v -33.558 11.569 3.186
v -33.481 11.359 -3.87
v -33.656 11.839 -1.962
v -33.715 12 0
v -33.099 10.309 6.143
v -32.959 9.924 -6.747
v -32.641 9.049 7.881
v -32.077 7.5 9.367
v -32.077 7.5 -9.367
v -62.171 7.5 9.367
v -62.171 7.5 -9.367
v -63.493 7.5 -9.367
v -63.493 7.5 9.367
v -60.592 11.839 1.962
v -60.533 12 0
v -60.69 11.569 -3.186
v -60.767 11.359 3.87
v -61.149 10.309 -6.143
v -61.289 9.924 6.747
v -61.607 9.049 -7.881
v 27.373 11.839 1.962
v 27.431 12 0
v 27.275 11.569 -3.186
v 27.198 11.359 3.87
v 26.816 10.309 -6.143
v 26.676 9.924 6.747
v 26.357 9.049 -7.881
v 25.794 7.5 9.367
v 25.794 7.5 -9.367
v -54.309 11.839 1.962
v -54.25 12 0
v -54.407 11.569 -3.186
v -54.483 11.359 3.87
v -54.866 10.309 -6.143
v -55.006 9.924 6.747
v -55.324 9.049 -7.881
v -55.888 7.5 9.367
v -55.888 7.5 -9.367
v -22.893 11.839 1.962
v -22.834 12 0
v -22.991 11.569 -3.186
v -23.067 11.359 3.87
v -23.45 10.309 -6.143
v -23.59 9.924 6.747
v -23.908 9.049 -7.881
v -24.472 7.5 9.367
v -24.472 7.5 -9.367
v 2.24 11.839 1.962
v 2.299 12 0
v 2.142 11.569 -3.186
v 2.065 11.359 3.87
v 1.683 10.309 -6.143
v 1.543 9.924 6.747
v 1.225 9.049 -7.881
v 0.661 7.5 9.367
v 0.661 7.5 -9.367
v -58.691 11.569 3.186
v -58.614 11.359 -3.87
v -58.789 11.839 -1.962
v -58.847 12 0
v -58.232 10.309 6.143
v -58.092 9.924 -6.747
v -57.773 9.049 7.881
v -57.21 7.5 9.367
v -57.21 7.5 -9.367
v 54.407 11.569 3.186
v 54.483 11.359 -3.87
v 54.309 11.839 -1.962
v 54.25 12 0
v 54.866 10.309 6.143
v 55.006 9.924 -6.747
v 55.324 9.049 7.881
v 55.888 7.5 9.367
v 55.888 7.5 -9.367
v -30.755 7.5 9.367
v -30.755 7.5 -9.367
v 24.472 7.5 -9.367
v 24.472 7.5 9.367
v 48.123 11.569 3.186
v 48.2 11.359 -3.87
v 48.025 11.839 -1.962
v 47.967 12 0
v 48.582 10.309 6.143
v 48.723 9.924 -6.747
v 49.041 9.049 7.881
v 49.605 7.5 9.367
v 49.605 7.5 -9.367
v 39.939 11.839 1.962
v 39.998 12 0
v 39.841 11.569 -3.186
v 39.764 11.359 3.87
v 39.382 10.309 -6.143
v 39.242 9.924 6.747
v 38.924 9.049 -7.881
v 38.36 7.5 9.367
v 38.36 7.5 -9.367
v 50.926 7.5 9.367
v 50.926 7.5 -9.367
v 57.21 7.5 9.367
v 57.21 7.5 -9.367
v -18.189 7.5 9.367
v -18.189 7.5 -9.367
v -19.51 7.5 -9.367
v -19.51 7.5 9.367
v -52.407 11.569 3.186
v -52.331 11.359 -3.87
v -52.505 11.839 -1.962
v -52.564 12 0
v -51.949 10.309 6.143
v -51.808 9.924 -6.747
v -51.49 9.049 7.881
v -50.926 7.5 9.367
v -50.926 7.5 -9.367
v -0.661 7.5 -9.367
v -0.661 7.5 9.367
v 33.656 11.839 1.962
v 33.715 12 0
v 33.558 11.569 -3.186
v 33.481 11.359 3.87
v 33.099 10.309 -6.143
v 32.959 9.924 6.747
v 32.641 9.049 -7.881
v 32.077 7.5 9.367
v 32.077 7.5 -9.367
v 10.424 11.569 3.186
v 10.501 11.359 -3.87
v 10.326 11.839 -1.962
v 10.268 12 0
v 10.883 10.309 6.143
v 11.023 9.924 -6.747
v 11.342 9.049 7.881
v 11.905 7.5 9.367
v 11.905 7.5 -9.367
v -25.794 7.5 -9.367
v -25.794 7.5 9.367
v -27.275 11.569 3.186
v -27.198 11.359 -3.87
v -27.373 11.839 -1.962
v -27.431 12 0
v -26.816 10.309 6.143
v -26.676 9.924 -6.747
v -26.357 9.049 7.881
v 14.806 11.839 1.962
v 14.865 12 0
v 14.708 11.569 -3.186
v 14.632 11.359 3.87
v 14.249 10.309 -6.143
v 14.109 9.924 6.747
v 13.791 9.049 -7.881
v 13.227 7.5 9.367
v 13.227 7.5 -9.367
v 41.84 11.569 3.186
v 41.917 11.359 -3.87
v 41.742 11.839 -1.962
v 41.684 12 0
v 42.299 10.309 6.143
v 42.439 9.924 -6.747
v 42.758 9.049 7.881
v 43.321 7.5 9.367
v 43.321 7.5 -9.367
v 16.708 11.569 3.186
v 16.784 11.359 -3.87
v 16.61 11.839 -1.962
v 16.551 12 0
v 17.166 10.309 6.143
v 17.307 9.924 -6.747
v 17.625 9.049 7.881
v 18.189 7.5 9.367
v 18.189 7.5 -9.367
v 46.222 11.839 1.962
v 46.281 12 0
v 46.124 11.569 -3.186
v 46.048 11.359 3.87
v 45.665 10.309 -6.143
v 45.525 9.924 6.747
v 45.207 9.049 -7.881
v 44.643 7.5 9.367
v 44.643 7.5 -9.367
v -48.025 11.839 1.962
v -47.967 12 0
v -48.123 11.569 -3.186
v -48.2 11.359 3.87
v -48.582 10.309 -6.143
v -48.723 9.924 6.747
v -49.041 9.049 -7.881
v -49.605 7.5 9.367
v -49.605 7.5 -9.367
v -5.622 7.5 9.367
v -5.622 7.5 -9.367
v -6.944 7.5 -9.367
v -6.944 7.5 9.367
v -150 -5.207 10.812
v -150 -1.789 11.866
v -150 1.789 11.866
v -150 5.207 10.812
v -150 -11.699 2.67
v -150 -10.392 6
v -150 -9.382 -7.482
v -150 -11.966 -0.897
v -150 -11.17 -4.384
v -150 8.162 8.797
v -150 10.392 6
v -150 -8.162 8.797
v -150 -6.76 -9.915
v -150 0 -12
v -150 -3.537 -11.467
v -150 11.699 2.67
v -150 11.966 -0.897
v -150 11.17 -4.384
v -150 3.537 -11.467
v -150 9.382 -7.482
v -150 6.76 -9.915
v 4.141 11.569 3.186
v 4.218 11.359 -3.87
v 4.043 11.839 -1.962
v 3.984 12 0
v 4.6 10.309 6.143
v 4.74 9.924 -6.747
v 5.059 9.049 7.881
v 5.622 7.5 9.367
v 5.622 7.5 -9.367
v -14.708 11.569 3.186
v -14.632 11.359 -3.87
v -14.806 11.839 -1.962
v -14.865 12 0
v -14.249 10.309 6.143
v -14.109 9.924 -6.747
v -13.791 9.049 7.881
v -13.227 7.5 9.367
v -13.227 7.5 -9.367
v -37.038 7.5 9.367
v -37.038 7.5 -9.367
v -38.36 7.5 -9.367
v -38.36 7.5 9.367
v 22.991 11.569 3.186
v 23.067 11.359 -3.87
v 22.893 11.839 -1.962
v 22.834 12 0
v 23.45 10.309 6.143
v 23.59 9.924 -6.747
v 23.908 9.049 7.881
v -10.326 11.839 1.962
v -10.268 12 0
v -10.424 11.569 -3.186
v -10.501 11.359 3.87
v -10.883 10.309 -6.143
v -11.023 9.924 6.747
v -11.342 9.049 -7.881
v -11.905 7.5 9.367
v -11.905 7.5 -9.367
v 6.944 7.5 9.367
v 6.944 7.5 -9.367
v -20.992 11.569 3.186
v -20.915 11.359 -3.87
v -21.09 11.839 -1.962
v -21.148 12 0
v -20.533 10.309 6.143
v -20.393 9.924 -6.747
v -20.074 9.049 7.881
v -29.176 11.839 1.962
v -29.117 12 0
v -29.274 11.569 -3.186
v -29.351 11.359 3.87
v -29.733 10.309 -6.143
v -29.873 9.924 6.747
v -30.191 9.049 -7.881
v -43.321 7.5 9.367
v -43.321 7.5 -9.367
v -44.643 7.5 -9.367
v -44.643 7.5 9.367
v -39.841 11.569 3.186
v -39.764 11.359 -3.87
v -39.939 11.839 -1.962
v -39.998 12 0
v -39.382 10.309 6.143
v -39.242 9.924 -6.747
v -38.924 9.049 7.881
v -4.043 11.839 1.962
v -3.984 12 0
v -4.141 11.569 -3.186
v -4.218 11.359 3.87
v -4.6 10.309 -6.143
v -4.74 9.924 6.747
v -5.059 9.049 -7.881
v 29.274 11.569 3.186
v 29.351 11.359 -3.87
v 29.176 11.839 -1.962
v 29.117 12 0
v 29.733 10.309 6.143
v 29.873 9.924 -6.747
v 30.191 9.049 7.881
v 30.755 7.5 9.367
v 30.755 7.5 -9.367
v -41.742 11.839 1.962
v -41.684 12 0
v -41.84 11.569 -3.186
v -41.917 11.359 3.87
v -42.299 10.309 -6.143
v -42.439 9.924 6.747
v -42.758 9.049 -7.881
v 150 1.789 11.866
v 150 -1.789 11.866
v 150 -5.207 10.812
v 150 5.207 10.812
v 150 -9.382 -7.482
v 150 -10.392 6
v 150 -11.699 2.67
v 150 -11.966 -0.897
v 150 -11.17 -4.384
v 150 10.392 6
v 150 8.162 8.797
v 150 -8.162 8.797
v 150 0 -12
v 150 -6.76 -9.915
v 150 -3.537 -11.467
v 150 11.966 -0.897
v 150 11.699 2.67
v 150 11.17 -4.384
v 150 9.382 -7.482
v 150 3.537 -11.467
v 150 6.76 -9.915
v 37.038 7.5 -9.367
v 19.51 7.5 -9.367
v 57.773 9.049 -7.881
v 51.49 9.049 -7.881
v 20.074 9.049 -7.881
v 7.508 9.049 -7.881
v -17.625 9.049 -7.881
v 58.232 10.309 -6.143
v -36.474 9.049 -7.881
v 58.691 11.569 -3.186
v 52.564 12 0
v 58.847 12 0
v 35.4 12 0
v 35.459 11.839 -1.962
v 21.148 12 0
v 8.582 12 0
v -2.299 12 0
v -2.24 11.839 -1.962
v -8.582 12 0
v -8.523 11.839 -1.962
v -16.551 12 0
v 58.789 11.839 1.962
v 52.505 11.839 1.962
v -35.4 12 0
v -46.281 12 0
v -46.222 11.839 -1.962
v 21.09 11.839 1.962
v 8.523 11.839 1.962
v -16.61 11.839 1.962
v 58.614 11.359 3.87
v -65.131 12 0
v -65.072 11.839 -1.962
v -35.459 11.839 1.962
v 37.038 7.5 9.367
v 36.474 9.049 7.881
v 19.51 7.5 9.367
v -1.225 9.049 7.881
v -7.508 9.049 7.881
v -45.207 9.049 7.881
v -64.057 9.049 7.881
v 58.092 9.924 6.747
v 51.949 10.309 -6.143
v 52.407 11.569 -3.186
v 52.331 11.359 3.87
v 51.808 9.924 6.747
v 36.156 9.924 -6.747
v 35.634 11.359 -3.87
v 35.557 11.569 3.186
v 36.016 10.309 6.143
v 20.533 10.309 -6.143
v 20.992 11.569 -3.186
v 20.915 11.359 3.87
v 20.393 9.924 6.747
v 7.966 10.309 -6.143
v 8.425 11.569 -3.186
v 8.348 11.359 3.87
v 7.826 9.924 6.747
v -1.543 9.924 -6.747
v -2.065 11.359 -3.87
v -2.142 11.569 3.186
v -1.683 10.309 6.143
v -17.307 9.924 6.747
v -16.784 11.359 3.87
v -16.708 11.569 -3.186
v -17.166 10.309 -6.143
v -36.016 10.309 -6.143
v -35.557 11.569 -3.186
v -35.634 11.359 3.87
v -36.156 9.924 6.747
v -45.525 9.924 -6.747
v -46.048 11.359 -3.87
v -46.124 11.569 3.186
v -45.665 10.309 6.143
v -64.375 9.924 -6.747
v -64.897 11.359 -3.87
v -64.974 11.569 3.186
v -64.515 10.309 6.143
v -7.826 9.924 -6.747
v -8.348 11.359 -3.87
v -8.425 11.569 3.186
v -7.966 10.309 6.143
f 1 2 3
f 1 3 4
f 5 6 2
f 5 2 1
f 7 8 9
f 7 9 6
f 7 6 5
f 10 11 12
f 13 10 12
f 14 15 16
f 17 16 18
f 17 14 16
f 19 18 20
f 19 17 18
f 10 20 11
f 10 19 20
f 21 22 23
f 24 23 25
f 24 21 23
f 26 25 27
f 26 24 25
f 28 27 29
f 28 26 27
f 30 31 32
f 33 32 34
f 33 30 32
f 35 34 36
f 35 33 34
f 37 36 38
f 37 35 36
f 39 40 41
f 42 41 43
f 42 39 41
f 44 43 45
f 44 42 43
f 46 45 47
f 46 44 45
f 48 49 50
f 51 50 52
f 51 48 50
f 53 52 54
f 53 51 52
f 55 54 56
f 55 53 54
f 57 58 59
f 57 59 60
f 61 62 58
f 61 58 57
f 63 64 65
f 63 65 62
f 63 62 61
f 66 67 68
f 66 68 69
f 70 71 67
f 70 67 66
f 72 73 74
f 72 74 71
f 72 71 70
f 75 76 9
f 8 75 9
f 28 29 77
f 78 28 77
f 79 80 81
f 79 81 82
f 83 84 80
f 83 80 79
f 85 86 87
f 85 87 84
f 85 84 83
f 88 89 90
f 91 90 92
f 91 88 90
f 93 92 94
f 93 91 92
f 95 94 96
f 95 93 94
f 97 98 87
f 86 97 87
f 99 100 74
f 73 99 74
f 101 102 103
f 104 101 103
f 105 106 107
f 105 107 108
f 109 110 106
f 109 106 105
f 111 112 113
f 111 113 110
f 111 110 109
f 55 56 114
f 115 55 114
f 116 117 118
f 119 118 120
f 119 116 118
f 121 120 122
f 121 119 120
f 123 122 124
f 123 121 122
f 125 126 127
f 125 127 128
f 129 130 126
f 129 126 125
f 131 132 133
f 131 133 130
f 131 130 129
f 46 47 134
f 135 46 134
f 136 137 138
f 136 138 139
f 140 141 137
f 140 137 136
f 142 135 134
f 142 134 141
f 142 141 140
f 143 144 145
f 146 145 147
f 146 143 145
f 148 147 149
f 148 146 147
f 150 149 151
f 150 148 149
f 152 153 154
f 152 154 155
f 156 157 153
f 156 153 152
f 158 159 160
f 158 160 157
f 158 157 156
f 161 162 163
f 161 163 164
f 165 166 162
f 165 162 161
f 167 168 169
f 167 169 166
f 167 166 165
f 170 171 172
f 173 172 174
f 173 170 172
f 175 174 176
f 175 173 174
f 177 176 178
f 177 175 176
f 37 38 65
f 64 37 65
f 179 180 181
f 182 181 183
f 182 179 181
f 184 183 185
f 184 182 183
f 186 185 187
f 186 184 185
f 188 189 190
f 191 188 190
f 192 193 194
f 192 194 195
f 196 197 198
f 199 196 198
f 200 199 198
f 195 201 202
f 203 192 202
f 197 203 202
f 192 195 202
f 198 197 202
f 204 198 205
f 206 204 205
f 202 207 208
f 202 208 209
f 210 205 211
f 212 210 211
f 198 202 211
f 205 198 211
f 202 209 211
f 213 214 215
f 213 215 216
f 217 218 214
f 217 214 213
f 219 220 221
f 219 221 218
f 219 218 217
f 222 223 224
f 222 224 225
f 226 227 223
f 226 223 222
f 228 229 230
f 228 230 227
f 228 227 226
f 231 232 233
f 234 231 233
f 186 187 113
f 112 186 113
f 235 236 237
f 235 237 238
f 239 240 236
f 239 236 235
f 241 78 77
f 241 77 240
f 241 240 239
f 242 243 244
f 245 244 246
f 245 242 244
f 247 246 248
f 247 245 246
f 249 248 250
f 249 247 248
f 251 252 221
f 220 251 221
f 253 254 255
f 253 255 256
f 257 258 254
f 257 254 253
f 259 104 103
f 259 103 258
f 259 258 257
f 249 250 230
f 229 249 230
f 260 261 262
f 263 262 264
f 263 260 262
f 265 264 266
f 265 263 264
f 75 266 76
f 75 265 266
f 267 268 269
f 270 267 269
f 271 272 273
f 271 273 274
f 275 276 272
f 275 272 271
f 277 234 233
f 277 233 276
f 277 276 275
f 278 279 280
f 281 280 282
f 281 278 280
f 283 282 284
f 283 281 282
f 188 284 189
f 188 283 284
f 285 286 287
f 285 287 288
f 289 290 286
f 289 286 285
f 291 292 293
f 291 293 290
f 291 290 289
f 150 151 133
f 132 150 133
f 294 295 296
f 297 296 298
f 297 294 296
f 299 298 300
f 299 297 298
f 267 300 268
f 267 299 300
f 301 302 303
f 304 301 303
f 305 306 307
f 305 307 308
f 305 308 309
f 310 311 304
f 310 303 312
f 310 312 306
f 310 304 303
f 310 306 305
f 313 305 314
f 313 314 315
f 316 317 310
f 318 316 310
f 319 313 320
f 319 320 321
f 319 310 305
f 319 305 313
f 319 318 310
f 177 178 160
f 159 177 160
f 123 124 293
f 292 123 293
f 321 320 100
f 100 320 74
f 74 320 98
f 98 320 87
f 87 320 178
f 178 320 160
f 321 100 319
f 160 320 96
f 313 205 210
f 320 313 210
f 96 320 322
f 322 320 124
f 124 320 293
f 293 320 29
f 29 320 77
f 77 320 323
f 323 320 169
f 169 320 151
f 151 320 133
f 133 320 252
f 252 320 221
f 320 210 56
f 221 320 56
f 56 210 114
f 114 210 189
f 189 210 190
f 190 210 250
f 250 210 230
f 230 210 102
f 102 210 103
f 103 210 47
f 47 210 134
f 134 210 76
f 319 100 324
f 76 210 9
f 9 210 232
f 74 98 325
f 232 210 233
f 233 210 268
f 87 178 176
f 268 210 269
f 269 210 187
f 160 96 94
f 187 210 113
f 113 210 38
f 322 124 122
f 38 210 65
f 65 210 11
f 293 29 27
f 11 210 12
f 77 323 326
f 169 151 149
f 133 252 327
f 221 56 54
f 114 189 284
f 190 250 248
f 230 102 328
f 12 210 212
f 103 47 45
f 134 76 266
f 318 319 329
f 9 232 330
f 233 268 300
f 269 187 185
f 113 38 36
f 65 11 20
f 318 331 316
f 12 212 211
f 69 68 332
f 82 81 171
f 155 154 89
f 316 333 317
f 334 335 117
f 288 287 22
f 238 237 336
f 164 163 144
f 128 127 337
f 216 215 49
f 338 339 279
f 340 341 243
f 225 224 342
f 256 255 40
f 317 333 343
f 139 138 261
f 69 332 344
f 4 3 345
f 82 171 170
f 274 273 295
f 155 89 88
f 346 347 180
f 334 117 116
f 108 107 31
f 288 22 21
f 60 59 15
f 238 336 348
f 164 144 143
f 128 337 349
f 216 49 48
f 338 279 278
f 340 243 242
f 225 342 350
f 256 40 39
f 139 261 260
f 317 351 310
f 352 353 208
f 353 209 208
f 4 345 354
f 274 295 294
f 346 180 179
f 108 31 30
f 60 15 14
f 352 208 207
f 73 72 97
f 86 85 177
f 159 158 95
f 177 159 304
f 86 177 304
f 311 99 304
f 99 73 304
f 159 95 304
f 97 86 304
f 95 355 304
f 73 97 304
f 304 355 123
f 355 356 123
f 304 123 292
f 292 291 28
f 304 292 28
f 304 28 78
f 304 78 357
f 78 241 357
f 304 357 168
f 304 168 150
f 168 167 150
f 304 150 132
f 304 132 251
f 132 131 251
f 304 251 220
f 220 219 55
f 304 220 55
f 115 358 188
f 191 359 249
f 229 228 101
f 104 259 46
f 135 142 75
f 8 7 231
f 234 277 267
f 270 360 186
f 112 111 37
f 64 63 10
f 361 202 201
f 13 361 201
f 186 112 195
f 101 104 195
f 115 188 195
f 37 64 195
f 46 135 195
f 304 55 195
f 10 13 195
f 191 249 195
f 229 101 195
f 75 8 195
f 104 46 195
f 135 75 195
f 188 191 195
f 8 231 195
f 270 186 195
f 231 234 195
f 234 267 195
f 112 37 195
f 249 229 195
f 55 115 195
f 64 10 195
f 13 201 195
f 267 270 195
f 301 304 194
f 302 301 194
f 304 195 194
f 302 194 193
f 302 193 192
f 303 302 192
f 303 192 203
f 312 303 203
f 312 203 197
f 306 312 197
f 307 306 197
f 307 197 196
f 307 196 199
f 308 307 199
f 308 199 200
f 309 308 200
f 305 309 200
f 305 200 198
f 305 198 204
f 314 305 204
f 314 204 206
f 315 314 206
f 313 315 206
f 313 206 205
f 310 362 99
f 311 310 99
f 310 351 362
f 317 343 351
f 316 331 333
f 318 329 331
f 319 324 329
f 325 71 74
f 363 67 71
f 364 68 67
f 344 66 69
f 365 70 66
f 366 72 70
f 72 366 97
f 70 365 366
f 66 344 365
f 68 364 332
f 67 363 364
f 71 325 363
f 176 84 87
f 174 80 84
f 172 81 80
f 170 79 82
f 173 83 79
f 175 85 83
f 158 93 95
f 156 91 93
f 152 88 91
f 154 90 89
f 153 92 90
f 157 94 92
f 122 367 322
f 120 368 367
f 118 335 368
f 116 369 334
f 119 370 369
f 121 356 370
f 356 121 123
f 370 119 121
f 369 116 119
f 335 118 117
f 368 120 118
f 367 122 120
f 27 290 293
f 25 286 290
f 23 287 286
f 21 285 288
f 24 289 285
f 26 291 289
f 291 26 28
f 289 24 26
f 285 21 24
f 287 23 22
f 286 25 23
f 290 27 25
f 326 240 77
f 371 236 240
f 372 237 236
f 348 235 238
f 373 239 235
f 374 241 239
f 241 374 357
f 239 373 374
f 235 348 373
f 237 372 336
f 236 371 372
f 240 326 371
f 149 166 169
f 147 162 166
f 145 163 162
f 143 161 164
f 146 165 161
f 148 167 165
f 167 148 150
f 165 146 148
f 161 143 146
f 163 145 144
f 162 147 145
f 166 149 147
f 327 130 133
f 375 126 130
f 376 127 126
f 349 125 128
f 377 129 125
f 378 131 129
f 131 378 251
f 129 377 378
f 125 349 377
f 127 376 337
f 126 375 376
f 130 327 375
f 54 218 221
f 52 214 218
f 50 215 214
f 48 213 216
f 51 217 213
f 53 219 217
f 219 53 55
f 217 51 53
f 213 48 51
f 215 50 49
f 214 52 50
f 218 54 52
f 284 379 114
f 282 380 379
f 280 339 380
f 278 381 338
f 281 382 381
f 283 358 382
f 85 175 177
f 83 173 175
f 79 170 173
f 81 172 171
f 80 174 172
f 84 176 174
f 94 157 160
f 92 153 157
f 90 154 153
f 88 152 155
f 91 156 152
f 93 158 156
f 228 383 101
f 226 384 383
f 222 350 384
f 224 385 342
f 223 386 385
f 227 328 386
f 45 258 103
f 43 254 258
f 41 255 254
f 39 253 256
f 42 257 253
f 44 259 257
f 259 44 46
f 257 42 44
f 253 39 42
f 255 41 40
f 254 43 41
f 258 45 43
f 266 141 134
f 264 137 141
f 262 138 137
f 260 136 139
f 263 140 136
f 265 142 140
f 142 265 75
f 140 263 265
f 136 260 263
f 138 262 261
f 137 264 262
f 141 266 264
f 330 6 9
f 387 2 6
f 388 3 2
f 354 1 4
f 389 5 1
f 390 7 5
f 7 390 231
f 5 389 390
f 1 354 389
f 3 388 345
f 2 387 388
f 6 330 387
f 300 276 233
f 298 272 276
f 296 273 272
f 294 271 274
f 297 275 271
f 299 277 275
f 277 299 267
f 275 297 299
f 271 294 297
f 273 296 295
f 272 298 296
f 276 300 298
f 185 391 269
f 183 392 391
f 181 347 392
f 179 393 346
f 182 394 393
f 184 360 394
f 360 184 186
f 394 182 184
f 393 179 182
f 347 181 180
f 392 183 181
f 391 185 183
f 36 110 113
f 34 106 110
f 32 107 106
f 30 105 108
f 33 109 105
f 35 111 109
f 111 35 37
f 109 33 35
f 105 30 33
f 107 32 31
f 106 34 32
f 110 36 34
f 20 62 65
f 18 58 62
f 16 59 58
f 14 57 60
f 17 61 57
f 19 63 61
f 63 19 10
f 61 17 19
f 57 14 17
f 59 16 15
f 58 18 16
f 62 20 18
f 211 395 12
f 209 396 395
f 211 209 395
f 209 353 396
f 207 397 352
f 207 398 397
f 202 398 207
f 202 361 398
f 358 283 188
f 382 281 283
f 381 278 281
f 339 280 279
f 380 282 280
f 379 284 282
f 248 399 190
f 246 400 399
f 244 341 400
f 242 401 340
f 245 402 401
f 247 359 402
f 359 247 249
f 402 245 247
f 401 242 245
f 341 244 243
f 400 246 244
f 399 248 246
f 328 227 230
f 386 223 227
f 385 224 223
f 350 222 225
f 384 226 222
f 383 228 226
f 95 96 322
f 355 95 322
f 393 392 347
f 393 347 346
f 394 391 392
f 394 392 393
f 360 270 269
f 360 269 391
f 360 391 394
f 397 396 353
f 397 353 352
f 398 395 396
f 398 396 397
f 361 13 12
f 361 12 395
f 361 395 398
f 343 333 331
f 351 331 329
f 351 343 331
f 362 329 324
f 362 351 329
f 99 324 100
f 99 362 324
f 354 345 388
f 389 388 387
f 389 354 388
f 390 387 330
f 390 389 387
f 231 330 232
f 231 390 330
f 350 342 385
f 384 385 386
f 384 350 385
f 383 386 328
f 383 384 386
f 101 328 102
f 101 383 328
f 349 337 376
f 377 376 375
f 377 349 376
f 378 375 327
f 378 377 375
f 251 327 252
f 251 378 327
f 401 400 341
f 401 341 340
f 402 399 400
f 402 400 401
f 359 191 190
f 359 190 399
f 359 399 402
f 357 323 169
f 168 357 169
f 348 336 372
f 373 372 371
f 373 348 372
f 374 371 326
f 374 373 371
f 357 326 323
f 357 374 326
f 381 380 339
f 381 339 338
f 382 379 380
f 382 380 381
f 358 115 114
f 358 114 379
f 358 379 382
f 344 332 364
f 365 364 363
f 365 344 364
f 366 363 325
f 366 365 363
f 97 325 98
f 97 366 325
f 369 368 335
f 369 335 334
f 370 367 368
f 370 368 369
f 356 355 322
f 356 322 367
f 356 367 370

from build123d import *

# Parameters (mm, degrees)
BOSS_EXTRUDE1_DEPTH      = 150
BOSS_EXTRUDE1_DEPTH_BACK = 150
SKETCH1_R                = 12
CUT_EXTRUDE1_DEPTH       = 151.956947505
LPATTERN1_COUNT          = 20
LPATTERN1_PITCH          = 6.283185307


with BuildPart() as part:
    # Sketch1 → Boss-Extrude1 (new, two sides: drawn at the far end of the back side and taken through both)
    with BuildSketch(Plane(origin=(0, 0, 0), x_dir=(0, 0, -1), z_dir=(1, 0, 0)).offset(-BOSS_EXTRUDE1_DEPTH_BACK)):
        Circle(SKETCH1_R)
    extrude(amount=BOSS_EXTRUDE1_DEPTH + BOSS_EXTRUDE1_DEPTH_BACK)

    # Sketch2 → Cut-Extrude1 (cut, symmetric)
    with BuildSketch(Plane.XY):
        Polygon((-62.170982331, 7.5), (-63.492723813, 7.5), (-65.130589867, 12), (-60.533116276, 12), align=None)
    cut_extrude1 = extrude(amount=CUT_EXTRUDE1_DEPTH, both=True, mode=Mode.SUBTRACT)

    # LPattern1: Cut-Extrude1 ×20
    with Locations(*[(i * LPATTERN1_PITCH, 0, 0) for i in range(1, LPATTERN1_COUNT)]):
        add(cut_extrude1, mode=Mode.SUBTRACT)


solid = part.part
